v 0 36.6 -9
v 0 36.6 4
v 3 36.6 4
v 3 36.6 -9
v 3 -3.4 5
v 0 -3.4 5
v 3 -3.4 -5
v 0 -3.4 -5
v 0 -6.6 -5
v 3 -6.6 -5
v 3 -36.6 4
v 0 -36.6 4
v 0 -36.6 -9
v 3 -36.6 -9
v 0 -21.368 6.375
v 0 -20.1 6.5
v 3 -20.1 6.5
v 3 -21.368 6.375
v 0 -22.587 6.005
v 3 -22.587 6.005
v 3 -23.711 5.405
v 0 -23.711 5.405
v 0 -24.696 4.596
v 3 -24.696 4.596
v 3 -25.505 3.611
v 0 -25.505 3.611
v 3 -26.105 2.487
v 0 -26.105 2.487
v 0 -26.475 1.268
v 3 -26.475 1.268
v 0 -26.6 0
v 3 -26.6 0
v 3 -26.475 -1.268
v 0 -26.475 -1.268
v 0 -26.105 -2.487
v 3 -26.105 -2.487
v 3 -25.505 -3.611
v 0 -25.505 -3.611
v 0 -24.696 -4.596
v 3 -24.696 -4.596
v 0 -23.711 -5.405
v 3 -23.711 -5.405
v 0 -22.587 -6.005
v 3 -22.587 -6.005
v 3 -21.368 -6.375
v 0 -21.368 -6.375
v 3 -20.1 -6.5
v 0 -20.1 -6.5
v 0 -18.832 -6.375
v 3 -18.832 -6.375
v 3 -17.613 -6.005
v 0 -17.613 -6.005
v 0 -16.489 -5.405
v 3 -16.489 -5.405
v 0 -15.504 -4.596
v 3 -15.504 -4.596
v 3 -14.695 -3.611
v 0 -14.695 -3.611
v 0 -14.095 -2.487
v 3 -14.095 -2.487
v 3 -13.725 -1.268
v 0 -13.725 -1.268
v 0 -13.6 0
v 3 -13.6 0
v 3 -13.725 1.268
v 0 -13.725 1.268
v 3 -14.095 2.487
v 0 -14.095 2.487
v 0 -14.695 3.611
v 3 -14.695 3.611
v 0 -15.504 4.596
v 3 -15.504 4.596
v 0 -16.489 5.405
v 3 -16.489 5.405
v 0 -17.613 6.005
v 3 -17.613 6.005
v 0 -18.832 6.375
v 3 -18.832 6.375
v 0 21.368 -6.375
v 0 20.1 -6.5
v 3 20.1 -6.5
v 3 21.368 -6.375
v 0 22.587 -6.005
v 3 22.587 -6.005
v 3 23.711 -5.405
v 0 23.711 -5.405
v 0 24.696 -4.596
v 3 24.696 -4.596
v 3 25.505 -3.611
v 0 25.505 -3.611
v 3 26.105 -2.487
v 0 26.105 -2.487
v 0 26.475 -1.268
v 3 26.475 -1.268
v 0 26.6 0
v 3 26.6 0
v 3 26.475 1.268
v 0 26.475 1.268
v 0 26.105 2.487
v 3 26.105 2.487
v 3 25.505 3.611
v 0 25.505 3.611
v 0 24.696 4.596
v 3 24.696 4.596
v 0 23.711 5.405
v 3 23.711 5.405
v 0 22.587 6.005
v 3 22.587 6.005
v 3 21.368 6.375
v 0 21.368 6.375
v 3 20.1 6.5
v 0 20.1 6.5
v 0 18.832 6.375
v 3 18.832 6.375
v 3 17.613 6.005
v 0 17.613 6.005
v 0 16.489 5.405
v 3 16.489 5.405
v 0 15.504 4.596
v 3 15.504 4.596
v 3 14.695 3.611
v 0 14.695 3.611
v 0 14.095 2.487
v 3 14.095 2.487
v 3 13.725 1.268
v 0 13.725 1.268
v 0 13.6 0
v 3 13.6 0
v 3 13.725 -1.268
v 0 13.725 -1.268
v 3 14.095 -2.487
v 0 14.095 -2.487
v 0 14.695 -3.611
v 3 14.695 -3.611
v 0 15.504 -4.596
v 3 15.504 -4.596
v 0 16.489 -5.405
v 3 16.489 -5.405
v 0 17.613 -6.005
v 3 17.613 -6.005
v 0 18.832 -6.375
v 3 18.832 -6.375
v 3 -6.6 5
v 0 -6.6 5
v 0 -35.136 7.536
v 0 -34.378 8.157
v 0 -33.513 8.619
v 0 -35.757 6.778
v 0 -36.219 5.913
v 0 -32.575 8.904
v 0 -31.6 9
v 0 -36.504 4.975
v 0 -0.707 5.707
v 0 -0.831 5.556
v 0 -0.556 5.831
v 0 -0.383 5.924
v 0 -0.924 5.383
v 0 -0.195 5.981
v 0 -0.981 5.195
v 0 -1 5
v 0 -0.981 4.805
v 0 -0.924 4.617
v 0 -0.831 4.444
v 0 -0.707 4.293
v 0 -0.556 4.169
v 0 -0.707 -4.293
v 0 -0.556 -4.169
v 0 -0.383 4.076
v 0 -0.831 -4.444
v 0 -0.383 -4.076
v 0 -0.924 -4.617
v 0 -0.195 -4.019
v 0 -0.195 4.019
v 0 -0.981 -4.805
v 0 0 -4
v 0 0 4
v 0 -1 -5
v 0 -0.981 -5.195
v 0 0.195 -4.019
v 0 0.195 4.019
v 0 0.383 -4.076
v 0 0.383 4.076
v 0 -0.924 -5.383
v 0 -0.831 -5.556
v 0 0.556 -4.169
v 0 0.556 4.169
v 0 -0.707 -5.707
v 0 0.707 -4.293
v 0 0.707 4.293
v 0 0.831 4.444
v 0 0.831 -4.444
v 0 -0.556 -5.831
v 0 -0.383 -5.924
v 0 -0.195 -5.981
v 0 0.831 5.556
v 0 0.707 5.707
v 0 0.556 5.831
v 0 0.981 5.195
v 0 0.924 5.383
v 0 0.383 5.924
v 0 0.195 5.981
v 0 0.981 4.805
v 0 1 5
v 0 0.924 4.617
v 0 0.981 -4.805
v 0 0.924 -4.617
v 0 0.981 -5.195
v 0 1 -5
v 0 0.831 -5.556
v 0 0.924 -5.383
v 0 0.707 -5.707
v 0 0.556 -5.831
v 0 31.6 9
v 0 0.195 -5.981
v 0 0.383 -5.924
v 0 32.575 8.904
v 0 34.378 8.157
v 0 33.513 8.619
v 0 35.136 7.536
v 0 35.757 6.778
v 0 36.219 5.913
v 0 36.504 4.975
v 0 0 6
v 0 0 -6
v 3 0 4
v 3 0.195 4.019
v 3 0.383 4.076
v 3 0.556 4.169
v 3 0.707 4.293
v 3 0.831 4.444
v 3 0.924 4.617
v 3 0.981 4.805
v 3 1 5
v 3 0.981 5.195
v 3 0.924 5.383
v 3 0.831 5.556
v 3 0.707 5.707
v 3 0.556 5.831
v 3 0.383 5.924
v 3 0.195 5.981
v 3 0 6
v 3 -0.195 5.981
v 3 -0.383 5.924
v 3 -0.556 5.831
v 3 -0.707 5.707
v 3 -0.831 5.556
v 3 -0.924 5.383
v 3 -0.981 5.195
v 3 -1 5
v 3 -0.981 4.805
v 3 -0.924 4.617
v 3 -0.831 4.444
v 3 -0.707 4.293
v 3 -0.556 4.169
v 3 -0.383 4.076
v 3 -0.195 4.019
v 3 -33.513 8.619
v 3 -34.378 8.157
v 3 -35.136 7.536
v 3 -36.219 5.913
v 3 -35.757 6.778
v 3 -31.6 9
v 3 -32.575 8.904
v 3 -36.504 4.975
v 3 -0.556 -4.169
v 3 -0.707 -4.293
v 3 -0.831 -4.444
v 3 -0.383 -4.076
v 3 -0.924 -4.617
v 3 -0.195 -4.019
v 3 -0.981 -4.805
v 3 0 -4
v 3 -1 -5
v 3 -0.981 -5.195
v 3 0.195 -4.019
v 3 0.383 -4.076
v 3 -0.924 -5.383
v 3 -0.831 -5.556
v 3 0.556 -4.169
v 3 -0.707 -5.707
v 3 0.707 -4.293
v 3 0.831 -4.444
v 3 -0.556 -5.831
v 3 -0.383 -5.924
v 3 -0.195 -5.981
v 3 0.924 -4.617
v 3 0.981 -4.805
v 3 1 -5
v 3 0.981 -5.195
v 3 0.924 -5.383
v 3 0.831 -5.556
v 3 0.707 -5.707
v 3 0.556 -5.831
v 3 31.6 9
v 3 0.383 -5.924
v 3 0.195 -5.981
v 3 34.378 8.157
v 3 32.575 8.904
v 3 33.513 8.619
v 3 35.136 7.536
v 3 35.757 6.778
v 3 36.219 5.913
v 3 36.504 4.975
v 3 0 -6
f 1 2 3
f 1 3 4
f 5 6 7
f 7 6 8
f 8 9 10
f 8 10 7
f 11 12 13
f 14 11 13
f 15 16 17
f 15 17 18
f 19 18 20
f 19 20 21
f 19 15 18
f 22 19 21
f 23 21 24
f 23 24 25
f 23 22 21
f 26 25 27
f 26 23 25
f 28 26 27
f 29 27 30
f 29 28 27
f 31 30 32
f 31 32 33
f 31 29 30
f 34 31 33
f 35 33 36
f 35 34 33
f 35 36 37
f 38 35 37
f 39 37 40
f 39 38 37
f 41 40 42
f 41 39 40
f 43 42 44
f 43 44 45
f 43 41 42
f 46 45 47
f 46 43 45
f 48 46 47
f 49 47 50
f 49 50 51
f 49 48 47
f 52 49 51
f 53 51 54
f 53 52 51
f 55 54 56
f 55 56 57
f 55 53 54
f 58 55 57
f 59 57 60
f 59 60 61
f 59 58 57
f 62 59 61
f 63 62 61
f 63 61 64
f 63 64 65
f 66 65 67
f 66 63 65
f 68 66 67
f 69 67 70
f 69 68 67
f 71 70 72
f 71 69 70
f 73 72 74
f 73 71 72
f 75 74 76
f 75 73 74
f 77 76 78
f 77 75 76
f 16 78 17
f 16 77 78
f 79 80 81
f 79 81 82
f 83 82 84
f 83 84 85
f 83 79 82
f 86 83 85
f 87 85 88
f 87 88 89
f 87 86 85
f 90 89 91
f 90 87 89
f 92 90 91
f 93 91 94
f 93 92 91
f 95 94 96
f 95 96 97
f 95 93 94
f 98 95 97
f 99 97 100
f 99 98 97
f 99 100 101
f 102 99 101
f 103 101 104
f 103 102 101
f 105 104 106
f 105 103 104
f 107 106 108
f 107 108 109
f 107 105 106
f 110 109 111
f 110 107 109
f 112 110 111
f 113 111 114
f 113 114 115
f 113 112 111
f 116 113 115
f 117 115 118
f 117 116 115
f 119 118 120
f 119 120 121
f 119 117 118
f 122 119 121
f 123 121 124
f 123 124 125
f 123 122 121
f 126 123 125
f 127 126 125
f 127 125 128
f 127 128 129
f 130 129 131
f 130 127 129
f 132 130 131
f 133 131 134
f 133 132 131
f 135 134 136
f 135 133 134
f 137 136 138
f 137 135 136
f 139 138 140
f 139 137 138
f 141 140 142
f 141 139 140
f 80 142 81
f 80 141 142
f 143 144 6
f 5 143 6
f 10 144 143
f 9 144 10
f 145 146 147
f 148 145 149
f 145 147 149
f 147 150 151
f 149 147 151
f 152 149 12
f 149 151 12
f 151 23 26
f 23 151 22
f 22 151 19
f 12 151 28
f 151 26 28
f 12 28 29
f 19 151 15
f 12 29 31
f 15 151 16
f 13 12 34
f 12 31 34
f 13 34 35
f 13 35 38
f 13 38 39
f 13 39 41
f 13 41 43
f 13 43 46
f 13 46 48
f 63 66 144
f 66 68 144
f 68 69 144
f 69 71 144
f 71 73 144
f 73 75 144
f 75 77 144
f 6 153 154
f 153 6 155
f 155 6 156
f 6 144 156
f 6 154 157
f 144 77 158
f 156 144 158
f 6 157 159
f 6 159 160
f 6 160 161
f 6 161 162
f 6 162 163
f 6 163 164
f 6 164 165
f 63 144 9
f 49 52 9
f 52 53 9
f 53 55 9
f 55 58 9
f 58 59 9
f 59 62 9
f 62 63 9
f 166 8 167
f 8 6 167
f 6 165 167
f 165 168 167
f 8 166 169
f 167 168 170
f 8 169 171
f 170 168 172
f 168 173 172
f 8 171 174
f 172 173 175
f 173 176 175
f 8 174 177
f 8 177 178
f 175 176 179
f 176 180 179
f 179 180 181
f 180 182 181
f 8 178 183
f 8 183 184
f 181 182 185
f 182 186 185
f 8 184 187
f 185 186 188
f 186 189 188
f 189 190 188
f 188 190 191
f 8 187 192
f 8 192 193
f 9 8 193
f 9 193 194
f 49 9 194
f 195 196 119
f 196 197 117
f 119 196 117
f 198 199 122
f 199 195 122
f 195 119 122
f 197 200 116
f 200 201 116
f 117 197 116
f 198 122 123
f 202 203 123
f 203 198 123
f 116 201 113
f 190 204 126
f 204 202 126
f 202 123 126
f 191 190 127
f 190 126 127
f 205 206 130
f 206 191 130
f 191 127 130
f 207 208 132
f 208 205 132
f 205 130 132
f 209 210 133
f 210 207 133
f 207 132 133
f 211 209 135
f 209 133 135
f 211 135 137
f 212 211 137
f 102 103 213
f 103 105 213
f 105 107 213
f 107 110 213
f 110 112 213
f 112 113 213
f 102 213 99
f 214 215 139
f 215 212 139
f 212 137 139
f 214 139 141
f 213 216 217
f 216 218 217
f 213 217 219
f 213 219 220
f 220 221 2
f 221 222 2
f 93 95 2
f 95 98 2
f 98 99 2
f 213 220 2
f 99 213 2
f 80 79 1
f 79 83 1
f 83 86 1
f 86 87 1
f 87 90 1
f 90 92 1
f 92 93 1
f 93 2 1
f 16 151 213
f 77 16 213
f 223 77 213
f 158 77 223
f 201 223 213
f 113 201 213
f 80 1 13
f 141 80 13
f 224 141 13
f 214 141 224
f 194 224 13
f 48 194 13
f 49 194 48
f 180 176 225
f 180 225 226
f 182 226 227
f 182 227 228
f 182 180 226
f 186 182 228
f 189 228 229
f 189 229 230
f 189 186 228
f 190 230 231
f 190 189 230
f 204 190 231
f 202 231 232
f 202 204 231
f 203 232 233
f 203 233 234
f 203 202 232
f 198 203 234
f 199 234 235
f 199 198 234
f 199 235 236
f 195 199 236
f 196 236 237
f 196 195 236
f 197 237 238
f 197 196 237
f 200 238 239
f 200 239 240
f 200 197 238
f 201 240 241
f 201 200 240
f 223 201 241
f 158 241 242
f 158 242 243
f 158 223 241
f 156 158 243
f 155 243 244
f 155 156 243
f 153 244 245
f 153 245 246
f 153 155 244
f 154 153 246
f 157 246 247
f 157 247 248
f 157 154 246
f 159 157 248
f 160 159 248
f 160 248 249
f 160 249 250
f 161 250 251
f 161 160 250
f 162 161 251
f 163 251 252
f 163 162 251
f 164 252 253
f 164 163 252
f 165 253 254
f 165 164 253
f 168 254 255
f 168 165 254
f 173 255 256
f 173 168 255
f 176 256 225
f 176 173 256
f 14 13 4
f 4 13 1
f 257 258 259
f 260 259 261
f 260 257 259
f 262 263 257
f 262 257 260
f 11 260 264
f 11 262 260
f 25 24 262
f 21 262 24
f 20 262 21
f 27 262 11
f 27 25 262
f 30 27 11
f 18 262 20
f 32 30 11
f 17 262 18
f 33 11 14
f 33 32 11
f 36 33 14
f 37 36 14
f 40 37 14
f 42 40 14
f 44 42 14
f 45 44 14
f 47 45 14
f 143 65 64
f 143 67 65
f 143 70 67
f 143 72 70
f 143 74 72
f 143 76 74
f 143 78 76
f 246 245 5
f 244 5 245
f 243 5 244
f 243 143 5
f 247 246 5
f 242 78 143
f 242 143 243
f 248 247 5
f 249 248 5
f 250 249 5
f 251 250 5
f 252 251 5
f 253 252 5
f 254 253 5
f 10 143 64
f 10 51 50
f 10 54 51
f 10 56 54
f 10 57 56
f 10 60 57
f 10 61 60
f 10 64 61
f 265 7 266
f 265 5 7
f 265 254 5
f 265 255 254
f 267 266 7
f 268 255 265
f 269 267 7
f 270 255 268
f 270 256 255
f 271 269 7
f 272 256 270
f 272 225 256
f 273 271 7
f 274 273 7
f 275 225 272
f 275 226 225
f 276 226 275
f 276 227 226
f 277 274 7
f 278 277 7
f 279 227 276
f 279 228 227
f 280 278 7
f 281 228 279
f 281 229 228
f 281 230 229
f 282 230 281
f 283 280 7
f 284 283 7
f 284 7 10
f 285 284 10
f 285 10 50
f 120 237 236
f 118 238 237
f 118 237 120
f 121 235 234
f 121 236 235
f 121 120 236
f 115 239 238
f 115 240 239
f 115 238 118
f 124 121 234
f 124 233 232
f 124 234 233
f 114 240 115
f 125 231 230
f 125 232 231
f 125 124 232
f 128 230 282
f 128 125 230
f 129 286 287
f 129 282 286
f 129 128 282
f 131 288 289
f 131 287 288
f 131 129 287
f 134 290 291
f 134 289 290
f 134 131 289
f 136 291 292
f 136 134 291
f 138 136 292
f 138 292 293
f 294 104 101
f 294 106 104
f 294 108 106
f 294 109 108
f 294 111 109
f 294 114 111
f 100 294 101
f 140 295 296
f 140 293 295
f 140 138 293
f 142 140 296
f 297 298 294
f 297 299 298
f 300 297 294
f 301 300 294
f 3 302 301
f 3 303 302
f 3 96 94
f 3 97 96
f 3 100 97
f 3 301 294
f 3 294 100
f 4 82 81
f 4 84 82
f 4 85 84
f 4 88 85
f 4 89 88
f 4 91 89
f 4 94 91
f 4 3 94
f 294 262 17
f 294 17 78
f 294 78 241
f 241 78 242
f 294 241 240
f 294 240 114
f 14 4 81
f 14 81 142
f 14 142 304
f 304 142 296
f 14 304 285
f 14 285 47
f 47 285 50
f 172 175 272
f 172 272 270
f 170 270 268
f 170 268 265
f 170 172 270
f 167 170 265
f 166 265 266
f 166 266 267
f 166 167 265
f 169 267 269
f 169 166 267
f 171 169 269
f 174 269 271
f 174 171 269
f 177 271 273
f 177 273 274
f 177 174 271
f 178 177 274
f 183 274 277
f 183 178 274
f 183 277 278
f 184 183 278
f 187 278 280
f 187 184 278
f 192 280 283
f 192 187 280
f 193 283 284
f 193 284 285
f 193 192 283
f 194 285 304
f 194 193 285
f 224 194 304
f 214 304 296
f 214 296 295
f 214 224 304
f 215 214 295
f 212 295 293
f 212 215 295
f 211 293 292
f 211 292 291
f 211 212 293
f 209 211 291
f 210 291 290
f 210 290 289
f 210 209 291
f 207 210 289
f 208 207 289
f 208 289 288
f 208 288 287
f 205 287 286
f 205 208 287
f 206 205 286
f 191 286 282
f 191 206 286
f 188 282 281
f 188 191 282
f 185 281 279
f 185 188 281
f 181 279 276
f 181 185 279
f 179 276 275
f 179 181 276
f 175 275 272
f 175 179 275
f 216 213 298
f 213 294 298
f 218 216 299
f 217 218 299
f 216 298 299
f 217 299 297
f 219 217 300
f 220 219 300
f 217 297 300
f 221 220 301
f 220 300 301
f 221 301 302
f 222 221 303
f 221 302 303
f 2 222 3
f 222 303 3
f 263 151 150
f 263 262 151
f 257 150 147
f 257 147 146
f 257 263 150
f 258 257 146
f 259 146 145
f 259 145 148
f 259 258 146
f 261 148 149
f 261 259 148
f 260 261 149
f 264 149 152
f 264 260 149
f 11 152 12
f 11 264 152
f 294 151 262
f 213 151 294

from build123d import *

# Parameters (mm, degrees)
CROQUIS1_W              = 18
CROQUIS1_H              = 73.2
CROQUIS1_R              = 6.5
CROQUIS1_R_2            = 1
CROQUIS1_W_2            = 10
CROQUIS1_H_2            = 3.2
SALIENTE_EXTRUIR1_DEPTH = 3
REDONDEO1_R             = 5


with BuildPart() as part:
    # Croquis1 → Saliente-Extruir1 (new body)
    with BuildSketch(Plane(origin=(0, 0, 0), x_dir=(0, 0, -1), z_dir=(1, 0, 0))):
        Rectangle(CROQUIS1_W, CROQUIS1_H)
        with Locations((0, 20.1)):
            Circle(CROQUIS1_R, mode=Mode.SUBTRACT)
        with Locations(Location((0, -20.1, 0), (0, 0, 180))):
            Circle(CROQUIS1_R, mode=Mode.SUBTRACT)
        with Locations((-5, 0)):
            Circle(CROQUIS1_R_2, mode=Mode.SUBTRACT)
        with Locations(Location((5, 0, 0), (0, 0, 180))):
            Circle(CROQUIS1_R_2, mode=Mode.SUBTRACT)
        with Locations((0, -5)):
            Rectangle(CROQUIS1_W_2, CROQUIS1_H_2, mode=Mode.SUBTRACT)
    extrude(amount=SALIENTE_EXTRUIR1_DEPTH)

    # Redondeo1
    redondeo1_edges = [part.edges().sort_by_distance(p)[0] for p in [
        (1.5, 36.6, 9),
        (1.5, -36.6, 9),
    ]]
    fillet(redondeo1_edges, radius=REDONDEO1_R)


solid = part.part
